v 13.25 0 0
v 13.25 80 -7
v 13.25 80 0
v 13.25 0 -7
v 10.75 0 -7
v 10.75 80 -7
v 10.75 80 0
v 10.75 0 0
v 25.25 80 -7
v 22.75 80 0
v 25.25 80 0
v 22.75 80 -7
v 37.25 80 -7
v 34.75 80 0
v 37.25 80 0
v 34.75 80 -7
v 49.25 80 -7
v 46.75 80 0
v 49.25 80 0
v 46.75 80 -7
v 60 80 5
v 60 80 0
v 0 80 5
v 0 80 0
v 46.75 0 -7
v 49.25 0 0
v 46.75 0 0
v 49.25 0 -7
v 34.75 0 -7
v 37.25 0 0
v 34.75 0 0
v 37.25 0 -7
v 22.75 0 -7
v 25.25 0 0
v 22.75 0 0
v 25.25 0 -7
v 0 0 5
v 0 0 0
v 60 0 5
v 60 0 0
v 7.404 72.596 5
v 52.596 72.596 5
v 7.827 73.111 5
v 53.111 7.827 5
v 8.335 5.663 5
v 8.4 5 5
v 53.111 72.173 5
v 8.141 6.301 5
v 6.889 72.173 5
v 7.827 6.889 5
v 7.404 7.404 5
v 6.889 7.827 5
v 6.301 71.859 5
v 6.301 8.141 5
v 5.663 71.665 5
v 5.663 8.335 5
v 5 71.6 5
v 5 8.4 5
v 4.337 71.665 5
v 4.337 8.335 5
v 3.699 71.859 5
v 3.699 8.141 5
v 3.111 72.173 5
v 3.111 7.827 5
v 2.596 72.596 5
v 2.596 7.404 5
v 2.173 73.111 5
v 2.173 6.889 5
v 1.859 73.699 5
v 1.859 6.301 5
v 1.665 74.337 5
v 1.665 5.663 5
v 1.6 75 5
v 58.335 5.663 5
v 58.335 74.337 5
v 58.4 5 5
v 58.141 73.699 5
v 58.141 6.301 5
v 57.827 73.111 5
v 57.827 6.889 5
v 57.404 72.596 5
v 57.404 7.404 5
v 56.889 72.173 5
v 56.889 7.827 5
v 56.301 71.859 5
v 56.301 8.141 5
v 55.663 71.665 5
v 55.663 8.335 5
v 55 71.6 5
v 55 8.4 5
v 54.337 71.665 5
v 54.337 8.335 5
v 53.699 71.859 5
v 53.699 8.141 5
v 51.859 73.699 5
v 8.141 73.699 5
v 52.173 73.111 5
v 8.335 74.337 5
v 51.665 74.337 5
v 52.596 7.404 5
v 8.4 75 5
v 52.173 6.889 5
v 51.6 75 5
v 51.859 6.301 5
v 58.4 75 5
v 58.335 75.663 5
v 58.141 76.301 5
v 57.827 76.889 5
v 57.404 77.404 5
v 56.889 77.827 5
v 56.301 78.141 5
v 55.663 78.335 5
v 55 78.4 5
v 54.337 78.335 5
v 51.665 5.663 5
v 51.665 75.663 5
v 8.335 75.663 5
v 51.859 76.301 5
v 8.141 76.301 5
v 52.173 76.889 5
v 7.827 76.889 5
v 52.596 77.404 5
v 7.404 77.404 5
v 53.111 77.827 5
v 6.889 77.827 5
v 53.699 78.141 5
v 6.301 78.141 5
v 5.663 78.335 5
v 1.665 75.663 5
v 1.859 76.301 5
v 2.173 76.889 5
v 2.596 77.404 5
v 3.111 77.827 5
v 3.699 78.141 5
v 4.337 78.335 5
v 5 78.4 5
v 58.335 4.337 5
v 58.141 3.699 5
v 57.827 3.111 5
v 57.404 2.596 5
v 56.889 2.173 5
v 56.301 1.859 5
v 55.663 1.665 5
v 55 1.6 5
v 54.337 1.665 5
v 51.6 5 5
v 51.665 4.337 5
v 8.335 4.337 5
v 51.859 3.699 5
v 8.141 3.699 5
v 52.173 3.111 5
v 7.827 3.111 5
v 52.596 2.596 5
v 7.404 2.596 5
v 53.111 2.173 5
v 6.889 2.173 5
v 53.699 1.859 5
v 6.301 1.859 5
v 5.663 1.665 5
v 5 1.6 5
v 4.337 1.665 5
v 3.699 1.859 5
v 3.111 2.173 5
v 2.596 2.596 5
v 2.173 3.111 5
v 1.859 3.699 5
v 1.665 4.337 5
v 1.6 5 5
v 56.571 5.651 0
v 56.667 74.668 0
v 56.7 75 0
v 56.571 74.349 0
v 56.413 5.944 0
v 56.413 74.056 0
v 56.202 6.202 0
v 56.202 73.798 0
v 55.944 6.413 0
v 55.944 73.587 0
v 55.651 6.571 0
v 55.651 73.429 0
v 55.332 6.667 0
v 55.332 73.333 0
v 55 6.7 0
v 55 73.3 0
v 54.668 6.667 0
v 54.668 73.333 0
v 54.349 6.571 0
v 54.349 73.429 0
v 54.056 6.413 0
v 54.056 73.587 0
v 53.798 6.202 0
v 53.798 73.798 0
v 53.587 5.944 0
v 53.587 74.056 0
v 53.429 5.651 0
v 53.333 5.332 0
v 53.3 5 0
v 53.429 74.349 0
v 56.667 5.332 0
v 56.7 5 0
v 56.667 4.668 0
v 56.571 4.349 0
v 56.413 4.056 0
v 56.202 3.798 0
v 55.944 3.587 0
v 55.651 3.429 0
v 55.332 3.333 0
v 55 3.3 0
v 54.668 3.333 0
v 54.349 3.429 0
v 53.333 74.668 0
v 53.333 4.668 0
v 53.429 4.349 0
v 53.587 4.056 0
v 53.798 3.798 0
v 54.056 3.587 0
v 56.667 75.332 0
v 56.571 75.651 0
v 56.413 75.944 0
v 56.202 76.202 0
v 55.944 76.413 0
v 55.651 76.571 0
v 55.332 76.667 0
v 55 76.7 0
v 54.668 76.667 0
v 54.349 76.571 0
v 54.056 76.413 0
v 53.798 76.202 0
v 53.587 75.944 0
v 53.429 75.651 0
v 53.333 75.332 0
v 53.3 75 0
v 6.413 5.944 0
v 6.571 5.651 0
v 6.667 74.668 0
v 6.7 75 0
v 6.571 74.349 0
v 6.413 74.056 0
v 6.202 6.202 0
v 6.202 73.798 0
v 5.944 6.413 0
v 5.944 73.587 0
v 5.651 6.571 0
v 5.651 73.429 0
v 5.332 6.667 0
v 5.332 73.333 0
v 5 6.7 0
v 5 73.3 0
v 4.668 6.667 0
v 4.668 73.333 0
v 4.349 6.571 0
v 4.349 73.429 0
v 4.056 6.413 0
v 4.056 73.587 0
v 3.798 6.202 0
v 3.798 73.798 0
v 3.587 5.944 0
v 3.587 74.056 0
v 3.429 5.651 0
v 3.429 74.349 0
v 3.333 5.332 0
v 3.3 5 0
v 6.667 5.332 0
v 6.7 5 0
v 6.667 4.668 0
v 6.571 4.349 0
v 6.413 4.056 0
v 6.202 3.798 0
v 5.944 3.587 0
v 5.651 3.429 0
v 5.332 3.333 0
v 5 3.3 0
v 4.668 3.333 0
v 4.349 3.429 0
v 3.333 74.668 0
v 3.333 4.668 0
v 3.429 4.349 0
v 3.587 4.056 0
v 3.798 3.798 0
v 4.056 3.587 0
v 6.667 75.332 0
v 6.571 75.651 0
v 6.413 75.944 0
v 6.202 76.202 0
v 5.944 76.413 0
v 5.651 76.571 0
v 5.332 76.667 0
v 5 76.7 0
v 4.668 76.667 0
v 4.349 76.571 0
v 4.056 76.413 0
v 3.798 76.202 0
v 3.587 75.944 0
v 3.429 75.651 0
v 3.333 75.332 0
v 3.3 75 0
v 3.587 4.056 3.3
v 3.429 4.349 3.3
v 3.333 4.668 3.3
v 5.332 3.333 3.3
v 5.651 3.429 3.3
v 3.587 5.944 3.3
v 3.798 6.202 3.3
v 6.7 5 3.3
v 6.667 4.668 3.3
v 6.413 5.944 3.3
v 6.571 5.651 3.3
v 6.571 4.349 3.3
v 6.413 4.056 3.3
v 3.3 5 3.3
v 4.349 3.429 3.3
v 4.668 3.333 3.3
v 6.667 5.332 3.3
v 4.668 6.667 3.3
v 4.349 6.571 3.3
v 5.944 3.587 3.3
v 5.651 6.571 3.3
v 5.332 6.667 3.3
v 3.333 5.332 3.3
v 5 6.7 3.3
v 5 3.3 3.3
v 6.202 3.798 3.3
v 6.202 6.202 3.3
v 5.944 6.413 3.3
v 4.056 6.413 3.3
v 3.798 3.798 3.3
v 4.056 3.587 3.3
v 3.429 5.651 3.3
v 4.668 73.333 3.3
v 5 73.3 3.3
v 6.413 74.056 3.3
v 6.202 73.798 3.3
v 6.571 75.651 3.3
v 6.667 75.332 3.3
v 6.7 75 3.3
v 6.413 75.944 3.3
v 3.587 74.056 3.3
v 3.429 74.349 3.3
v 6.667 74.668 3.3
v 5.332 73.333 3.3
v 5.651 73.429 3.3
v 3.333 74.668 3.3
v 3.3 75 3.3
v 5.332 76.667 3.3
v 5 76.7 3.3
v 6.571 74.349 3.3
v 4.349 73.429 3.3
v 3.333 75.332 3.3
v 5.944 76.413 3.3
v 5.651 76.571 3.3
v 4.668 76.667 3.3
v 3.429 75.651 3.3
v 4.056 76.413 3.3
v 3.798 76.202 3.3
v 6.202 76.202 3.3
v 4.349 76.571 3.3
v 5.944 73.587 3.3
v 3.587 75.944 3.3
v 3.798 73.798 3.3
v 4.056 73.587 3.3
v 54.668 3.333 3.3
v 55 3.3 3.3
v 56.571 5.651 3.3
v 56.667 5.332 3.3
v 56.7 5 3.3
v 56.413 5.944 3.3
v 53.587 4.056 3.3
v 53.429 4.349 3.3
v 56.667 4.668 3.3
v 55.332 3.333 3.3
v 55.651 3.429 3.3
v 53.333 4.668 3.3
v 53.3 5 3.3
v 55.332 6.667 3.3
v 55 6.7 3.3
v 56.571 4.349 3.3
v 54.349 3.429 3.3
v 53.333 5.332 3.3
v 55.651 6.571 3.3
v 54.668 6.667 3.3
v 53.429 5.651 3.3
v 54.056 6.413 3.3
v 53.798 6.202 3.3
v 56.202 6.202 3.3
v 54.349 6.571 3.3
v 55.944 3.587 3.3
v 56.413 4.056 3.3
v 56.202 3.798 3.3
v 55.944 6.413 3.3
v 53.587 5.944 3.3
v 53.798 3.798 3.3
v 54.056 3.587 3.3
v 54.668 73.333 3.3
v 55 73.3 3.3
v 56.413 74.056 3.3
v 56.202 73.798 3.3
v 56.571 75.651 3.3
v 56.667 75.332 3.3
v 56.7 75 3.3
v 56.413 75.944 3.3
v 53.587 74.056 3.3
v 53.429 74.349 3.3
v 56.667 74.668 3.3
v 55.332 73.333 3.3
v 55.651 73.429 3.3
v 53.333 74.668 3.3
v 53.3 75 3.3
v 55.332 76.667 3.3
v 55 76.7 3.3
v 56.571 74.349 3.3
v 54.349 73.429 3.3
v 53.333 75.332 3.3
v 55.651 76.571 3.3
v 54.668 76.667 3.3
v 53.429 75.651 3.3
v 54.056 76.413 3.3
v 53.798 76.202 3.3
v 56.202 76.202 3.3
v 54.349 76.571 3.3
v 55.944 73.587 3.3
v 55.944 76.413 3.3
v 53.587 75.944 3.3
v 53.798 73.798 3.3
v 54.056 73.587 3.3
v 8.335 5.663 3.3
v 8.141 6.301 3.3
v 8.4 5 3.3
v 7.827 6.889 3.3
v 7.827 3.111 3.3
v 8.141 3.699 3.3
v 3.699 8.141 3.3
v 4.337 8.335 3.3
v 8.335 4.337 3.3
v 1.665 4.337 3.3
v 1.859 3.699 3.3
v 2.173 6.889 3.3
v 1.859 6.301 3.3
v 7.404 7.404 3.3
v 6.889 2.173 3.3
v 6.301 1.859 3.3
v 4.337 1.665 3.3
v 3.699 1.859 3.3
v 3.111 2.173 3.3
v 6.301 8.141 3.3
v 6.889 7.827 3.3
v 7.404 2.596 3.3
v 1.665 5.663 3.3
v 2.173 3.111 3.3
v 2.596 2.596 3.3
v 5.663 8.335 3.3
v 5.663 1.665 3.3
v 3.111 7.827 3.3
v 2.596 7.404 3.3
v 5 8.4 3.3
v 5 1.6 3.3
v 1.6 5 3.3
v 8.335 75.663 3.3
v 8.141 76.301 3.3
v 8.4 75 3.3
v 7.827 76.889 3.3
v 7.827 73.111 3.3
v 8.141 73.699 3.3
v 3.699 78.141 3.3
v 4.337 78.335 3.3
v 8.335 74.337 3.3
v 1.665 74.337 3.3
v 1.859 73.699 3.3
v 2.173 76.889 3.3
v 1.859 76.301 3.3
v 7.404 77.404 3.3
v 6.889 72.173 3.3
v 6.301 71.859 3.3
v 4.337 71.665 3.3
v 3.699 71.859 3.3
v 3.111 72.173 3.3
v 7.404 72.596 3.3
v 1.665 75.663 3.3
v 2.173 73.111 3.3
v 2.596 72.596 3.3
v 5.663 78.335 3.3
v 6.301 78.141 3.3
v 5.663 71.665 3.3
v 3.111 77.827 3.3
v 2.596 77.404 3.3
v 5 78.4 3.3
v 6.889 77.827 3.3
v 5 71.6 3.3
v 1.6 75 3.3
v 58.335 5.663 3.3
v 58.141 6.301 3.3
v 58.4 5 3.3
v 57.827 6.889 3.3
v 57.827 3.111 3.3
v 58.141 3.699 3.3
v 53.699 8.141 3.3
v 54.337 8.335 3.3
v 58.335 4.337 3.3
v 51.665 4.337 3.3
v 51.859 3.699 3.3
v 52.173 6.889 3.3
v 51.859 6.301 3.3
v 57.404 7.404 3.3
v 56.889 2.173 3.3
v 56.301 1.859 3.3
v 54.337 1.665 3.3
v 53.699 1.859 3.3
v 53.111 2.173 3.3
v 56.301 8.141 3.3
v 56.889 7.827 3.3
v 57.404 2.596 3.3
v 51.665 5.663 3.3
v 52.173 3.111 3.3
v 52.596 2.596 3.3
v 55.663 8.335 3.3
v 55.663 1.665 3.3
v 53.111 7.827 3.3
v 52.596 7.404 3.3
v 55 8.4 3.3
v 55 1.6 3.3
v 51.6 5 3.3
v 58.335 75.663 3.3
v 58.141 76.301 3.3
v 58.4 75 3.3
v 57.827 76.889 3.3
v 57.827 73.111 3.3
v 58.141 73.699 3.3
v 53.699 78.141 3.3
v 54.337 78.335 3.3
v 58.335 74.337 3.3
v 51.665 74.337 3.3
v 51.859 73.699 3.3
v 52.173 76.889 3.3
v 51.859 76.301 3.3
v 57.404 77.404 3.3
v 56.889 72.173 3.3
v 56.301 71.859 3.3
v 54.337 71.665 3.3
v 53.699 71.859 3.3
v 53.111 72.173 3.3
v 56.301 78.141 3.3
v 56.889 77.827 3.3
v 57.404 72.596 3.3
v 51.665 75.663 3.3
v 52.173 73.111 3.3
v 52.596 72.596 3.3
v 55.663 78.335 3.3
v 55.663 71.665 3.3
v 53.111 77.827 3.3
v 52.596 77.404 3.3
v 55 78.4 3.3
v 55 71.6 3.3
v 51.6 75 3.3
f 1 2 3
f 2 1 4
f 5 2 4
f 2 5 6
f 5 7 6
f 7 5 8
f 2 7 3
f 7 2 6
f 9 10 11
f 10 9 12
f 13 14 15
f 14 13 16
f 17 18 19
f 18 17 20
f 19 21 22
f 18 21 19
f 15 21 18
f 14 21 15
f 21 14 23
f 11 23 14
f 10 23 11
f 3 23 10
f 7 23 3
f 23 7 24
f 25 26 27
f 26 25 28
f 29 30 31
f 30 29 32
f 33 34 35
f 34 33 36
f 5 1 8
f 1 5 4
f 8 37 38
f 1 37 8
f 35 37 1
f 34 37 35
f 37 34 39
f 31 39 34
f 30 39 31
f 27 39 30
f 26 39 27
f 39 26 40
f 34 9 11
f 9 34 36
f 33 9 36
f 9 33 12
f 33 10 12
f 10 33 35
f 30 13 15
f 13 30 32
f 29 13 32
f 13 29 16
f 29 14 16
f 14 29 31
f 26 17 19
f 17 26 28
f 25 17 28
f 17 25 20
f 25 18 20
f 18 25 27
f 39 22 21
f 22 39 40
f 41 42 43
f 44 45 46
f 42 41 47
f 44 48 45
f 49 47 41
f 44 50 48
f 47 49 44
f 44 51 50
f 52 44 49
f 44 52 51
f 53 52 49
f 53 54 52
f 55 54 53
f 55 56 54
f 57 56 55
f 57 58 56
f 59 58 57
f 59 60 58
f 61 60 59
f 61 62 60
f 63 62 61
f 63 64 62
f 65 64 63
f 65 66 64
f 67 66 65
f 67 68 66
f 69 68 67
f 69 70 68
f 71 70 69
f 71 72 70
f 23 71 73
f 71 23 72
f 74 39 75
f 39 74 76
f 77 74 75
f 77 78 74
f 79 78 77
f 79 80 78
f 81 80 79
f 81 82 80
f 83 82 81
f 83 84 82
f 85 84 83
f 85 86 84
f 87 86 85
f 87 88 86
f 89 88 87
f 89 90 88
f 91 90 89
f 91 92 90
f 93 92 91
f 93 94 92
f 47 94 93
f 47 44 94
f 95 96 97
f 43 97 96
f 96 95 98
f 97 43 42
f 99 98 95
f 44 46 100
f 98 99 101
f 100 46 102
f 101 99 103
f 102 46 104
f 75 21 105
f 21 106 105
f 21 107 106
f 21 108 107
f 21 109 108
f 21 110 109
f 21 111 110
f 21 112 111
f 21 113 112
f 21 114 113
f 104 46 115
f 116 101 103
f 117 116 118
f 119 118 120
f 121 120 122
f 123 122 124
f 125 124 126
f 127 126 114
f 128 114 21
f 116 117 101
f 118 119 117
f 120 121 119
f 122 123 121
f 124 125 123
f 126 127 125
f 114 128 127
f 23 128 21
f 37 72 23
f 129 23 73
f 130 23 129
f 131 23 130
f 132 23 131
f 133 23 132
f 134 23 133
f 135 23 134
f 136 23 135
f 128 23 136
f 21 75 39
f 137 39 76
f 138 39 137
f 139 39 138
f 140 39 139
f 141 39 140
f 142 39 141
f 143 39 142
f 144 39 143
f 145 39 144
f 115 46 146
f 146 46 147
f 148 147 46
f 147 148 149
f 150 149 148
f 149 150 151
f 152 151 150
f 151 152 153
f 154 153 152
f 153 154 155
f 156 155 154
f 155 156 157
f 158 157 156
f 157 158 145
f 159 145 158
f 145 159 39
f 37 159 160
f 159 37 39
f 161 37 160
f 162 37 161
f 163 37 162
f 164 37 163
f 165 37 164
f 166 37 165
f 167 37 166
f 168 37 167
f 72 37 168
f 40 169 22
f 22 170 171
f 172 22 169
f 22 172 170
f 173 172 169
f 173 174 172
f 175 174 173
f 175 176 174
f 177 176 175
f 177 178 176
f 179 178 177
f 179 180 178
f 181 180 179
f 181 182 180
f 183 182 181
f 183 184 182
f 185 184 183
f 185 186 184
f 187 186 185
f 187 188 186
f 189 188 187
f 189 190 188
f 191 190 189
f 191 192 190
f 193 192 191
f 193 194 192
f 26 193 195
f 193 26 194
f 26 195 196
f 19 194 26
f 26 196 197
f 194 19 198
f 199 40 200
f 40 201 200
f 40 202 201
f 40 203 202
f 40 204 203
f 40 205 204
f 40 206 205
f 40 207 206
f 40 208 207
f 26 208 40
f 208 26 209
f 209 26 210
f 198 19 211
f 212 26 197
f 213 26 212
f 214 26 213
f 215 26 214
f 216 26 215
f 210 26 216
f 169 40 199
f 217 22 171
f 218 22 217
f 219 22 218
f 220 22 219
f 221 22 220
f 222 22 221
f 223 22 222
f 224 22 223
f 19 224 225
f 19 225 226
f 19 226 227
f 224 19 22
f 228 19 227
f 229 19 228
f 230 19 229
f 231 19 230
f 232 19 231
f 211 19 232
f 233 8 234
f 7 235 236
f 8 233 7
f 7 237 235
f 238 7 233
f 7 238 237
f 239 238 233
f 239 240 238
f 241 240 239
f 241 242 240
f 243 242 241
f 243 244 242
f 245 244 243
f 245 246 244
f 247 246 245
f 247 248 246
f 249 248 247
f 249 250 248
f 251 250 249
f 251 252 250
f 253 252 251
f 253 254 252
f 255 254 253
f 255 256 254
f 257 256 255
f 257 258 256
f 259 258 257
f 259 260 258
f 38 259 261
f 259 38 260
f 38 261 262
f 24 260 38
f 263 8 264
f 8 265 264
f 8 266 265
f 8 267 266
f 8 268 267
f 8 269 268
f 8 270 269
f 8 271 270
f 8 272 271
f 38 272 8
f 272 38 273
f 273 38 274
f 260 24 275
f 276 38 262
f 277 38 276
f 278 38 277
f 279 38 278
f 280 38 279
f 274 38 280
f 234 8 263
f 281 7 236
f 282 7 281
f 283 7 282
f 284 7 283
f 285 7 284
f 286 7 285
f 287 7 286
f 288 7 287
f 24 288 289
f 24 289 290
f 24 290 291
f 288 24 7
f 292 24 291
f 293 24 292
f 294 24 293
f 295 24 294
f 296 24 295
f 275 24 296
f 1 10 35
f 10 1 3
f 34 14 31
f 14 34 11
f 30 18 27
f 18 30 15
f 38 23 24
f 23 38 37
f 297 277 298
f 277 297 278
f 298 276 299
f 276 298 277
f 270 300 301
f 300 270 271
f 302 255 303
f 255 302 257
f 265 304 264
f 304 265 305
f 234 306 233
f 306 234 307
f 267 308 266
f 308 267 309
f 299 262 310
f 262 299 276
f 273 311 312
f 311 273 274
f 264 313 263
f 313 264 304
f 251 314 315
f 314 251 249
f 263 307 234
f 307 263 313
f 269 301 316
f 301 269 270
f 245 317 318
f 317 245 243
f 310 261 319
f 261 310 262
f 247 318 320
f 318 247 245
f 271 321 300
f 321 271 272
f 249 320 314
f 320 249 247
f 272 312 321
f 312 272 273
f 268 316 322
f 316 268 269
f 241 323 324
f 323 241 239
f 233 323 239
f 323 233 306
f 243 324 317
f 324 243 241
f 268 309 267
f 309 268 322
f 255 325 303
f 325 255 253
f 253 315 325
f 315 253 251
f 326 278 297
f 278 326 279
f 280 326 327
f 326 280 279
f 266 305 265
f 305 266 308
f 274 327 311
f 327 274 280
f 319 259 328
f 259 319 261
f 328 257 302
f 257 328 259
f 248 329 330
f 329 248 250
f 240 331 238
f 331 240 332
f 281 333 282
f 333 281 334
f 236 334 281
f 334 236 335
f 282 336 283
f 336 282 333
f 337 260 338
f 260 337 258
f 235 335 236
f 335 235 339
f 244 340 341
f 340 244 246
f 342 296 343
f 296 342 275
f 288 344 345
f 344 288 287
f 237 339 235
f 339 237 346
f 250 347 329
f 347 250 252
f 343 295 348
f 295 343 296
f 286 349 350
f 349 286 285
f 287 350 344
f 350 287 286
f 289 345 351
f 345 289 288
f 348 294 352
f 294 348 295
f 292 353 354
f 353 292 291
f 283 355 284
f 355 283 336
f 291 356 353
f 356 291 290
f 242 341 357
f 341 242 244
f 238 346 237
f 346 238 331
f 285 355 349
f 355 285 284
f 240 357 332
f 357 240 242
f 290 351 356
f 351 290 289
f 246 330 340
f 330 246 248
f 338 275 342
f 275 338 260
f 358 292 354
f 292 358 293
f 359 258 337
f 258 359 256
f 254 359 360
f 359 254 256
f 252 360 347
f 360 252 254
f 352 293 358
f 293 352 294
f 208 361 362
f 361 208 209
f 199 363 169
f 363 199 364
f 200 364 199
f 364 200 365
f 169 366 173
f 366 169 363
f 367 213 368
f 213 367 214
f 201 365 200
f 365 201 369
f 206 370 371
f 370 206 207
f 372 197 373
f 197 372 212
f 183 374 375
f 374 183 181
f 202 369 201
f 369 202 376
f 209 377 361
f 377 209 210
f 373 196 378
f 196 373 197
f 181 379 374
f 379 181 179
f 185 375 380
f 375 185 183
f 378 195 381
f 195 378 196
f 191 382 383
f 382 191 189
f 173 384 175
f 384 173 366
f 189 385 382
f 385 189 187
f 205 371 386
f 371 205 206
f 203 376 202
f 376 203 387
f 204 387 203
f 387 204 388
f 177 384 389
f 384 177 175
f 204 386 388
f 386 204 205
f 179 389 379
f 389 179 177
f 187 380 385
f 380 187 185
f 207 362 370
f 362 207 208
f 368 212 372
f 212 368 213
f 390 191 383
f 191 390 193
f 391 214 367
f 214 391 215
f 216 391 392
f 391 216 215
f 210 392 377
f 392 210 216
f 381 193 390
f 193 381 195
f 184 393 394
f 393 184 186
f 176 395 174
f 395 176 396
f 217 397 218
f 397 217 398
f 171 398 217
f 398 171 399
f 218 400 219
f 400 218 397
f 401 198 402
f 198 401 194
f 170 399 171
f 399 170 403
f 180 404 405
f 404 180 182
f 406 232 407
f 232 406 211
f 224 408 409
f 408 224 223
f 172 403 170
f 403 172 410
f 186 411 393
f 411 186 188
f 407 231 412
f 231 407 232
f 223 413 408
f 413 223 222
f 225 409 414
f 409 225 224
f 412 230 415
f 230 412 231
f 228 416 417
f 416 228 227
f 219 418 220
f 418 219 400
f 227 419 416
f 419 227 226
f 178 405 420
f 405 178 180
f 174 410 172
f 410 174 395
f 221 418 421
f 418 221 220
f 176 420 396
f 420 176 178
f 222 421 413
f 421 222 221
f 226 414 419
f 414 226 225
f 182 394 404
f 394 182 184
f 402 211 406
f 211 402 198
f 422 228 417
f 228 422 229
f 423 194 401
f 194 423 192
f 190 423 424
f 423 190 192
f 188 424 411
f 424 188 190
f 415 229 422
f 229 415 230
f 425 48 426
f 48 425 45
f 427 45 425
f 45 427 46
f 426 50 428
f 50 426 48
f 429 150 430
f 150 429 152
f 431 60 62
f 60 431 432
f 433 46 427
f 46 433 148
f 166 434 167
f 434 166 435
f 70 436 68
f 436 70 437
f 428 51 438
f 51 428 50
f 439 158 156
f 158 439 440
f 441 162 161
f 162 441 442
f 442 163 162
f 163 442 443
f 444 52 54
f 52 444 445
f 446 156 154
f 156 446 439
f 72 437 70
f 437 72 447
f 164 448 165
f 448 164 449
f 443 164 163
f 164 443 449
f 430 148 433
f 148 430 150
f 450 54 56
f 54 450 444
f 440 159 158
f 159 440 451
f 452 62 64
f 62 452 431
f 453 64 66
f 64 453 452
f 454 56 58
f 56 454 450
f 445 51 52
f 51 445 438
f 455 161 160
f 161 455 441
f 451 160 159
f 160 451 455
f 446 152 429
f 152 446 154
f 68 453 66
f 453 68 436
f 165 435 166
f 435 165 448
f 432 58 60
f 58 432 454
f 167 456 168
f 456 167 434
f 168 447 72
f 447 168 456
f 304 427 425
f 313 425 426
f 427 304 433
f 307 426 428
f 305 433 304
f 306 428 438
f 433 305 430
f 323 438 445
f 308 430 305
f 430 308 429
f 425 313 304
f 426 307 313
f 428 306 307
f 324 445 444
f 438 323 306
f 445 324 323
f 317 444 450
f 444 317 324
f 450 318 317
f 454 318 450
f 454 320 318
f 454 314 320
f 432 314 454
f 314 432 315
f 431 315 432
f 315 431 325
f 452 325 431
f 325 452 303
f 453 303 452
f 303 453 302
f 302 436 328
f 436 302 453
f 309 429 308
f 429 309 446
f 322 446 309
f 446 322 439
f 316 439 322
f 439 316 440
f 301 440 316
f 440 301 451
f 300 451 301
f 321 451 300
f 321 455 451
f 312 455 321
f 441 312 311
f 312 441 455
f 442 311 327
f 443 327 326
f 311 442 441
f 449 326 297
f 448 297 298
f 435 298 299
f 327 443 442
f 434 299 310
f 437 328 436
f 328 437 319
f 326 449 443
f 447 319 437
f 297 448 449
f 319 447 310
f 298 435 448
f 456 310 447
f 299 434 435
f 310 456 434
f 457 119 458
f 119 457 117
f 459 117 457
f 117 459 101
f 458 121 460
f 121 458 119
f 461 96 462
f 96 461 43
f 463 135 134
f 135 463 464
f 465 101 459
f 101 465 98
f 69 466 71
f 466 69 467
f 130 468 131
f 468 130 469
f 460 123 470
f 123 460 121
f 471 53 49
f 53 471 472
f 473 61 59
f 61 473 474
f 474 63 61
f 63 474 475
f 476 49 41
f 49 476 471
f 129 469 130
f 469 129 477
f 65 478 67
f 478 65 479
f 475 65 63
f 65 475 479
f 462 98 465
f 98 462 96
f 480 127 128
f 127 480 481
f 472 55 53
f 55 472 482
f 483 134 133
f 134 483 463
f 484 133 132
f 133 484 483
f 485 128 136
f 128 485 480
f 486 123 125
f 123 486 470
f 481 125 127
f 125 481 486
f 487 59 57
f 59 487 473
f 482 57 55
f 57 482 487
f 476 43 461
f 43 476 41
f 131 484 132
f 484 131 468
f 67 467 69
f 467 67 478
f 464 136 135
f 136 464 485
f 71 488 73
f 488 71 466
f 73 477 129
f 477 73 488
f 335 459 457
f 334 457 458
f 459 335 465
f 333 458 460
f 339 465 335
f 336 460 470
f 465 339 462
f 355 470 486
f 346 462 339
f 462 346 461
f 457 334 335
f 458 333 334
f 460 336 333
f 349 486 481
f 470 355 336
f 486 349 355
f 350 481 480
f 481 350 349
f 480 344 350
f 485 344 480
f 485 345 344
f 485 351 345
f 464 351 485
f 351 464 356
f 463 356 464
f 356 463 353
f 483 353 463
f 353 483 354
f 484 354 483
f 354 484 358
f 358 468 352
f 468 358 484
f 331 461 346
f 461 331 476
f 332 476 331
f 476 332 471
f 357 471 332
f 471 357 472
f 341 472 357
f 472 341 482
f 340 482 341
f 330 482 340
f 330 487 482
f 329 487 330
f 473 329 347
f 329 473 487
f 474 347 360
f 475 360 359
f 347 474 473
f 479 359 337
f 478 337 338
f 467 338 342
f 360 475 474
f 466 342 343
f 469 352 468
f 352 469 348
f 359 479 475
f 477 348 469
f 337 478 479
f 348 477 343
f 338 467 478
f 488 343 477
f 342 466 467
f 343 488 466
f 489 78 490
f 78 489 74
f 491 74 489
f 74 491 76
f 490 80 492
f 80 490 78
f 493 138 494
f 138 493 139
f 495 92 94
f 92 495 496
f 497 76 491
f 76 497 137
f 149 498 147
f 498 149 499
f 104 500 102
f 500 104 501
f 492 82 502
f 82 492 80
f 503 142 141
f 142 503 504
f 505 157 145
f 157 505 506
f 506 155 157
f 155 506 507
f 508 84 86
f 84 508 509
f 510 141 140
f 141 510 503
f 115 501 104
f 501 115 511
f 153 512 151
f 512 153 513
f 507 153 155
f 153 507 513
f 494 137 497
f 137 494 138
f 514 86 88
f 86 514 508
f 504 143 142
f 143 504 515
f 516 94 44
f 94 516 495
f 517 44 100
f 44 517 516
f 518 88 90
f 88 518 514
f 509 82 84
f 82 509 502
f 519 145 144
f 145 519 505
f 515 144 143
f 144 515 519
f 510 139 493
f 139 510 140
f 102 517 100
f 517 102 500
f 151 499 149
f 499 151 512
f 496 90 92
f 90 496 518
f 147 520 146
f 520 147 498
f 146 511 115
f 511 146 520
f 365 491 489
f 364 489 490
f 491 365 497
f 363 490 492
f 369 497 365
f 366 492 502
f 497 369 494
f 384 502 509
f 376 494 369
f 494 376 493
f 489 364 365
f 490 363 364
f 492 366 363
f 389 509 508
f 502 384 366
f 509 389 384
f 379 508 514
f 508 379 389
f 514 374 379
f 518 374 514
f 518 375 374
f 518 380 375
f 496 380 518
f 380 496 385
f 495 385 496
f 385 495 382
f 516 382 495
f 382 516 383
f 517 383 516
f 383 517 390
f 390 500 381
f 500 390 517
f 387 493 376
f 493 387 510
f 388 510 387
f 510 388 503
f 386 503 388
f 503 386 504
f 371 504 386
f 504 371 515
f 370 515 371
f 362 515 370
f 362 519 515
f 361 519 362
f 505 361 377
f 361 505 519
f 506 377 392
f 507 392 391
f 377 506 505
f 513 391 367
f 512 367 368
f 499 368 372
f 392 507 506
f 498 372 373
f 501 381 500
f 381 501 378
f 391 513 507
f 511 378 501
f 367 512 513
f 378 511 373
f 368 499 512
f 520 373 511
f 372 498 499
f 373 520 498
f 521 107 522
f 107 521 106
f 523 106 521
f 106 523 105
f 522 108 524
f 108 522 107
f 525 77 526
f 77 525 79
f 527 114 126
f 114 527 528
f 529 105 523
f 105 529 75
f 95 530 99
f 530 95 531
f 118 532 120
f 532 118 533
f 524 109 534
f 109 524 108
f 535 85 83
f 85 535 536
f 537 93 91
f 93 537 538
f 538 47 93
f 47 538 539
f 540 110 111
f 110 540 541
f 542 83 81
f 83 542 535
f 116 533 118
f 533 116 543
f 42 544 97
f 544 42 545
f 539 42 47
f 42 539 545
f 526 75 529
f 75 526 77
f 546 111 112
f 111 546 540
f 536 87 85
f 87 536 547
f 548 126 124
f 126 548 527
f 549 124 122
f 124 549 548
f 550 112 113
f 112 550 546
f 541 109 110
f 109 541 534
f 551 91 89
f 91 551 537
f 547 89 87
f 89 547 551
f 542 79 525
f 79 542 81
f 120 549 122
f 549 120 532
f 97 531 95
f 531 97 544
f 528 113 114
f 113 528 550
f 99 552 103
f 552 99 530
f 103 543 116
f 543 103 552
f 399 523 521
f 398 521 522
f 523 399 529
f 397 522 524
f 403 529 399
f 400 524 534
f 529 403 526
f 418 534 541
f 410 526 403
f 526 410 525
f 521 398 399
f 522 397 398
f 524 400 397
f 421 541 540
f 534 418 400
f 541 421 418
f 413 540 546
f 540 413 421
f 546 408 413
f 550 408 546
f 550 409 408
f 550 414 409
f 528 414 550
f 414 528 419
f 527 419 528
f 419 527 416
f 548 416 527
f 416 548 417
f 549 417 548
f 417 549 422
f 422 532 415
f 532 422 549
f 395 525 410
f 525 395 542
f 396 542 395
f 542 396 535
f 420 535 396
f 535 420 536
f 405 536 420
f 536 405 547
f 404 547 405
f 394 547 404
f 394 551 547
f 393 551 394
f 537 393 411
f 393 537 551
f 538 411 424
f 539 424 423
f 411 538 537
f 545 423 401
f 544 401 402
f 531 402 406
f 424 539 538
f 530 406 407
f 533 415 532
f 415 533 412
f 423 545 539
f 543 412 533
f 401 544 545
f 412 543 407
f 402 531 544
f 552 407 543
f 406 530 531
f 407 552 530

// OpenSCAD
$fn = 32;

// ----------------------------------------------------------------------
// Enclosure lid: 60 x 80 x 5 mm, 4 bolt holes
// ----------------------------------------------------------------------

// --- parameters (mm) ---
length = 60;              // lid length, X
width = 80;               // lid width, Y
plate_t = 5;              // lid plate thickness
bolt_d = 3.4;             // bolt clearance
boss_lip = 5;             // bolt hole inset from the corner
sink = 1;                 // overlap of the lip and ribs into the plate
cs_d = 6.8;               // countersink diameter
cs_h = 1.7;               // countersink depth
rib_n = 4;                // stiffening ribs
rib_t = 2.5;              // rib thickness
rib_h = 8;                // rib height below the plate

module plate() {
  cube([length, width, plate_t]);
  /* stiffening ribs under the plate */
  for (i = [1 : rib_n]) translate([length * i / (rib_n + 1) - rib_t / 2, 0, -rib_h + sink]) cube([rib_t, width - 2 * 0, rib_h]);
}

difference() {
  plate();
  /* bolt pattern matching the corner bosses */
  for (sx = [0, 1]) for (sy = [0, 1])
    translate([sx * (length - 2 * boss_lip) + boss_lip, sy * (width - 2 * boss_lip) + boss_lip, -0 - 1])
      cylinder(h = plate_t + 0 + 2, d = bolt_d);
  /* countersinks so the heads sit flush */
  for (sx = [0, 1]) for (sy = [0, 1])
    translate([sx * (length - 2 * boss_lip) + boss_lip, sy * (width - 2 * boss_lip) + boss_lip, plate_t - cs_h])
      cylinder(h = cs_h + 0.5, d = cs_d);
}
